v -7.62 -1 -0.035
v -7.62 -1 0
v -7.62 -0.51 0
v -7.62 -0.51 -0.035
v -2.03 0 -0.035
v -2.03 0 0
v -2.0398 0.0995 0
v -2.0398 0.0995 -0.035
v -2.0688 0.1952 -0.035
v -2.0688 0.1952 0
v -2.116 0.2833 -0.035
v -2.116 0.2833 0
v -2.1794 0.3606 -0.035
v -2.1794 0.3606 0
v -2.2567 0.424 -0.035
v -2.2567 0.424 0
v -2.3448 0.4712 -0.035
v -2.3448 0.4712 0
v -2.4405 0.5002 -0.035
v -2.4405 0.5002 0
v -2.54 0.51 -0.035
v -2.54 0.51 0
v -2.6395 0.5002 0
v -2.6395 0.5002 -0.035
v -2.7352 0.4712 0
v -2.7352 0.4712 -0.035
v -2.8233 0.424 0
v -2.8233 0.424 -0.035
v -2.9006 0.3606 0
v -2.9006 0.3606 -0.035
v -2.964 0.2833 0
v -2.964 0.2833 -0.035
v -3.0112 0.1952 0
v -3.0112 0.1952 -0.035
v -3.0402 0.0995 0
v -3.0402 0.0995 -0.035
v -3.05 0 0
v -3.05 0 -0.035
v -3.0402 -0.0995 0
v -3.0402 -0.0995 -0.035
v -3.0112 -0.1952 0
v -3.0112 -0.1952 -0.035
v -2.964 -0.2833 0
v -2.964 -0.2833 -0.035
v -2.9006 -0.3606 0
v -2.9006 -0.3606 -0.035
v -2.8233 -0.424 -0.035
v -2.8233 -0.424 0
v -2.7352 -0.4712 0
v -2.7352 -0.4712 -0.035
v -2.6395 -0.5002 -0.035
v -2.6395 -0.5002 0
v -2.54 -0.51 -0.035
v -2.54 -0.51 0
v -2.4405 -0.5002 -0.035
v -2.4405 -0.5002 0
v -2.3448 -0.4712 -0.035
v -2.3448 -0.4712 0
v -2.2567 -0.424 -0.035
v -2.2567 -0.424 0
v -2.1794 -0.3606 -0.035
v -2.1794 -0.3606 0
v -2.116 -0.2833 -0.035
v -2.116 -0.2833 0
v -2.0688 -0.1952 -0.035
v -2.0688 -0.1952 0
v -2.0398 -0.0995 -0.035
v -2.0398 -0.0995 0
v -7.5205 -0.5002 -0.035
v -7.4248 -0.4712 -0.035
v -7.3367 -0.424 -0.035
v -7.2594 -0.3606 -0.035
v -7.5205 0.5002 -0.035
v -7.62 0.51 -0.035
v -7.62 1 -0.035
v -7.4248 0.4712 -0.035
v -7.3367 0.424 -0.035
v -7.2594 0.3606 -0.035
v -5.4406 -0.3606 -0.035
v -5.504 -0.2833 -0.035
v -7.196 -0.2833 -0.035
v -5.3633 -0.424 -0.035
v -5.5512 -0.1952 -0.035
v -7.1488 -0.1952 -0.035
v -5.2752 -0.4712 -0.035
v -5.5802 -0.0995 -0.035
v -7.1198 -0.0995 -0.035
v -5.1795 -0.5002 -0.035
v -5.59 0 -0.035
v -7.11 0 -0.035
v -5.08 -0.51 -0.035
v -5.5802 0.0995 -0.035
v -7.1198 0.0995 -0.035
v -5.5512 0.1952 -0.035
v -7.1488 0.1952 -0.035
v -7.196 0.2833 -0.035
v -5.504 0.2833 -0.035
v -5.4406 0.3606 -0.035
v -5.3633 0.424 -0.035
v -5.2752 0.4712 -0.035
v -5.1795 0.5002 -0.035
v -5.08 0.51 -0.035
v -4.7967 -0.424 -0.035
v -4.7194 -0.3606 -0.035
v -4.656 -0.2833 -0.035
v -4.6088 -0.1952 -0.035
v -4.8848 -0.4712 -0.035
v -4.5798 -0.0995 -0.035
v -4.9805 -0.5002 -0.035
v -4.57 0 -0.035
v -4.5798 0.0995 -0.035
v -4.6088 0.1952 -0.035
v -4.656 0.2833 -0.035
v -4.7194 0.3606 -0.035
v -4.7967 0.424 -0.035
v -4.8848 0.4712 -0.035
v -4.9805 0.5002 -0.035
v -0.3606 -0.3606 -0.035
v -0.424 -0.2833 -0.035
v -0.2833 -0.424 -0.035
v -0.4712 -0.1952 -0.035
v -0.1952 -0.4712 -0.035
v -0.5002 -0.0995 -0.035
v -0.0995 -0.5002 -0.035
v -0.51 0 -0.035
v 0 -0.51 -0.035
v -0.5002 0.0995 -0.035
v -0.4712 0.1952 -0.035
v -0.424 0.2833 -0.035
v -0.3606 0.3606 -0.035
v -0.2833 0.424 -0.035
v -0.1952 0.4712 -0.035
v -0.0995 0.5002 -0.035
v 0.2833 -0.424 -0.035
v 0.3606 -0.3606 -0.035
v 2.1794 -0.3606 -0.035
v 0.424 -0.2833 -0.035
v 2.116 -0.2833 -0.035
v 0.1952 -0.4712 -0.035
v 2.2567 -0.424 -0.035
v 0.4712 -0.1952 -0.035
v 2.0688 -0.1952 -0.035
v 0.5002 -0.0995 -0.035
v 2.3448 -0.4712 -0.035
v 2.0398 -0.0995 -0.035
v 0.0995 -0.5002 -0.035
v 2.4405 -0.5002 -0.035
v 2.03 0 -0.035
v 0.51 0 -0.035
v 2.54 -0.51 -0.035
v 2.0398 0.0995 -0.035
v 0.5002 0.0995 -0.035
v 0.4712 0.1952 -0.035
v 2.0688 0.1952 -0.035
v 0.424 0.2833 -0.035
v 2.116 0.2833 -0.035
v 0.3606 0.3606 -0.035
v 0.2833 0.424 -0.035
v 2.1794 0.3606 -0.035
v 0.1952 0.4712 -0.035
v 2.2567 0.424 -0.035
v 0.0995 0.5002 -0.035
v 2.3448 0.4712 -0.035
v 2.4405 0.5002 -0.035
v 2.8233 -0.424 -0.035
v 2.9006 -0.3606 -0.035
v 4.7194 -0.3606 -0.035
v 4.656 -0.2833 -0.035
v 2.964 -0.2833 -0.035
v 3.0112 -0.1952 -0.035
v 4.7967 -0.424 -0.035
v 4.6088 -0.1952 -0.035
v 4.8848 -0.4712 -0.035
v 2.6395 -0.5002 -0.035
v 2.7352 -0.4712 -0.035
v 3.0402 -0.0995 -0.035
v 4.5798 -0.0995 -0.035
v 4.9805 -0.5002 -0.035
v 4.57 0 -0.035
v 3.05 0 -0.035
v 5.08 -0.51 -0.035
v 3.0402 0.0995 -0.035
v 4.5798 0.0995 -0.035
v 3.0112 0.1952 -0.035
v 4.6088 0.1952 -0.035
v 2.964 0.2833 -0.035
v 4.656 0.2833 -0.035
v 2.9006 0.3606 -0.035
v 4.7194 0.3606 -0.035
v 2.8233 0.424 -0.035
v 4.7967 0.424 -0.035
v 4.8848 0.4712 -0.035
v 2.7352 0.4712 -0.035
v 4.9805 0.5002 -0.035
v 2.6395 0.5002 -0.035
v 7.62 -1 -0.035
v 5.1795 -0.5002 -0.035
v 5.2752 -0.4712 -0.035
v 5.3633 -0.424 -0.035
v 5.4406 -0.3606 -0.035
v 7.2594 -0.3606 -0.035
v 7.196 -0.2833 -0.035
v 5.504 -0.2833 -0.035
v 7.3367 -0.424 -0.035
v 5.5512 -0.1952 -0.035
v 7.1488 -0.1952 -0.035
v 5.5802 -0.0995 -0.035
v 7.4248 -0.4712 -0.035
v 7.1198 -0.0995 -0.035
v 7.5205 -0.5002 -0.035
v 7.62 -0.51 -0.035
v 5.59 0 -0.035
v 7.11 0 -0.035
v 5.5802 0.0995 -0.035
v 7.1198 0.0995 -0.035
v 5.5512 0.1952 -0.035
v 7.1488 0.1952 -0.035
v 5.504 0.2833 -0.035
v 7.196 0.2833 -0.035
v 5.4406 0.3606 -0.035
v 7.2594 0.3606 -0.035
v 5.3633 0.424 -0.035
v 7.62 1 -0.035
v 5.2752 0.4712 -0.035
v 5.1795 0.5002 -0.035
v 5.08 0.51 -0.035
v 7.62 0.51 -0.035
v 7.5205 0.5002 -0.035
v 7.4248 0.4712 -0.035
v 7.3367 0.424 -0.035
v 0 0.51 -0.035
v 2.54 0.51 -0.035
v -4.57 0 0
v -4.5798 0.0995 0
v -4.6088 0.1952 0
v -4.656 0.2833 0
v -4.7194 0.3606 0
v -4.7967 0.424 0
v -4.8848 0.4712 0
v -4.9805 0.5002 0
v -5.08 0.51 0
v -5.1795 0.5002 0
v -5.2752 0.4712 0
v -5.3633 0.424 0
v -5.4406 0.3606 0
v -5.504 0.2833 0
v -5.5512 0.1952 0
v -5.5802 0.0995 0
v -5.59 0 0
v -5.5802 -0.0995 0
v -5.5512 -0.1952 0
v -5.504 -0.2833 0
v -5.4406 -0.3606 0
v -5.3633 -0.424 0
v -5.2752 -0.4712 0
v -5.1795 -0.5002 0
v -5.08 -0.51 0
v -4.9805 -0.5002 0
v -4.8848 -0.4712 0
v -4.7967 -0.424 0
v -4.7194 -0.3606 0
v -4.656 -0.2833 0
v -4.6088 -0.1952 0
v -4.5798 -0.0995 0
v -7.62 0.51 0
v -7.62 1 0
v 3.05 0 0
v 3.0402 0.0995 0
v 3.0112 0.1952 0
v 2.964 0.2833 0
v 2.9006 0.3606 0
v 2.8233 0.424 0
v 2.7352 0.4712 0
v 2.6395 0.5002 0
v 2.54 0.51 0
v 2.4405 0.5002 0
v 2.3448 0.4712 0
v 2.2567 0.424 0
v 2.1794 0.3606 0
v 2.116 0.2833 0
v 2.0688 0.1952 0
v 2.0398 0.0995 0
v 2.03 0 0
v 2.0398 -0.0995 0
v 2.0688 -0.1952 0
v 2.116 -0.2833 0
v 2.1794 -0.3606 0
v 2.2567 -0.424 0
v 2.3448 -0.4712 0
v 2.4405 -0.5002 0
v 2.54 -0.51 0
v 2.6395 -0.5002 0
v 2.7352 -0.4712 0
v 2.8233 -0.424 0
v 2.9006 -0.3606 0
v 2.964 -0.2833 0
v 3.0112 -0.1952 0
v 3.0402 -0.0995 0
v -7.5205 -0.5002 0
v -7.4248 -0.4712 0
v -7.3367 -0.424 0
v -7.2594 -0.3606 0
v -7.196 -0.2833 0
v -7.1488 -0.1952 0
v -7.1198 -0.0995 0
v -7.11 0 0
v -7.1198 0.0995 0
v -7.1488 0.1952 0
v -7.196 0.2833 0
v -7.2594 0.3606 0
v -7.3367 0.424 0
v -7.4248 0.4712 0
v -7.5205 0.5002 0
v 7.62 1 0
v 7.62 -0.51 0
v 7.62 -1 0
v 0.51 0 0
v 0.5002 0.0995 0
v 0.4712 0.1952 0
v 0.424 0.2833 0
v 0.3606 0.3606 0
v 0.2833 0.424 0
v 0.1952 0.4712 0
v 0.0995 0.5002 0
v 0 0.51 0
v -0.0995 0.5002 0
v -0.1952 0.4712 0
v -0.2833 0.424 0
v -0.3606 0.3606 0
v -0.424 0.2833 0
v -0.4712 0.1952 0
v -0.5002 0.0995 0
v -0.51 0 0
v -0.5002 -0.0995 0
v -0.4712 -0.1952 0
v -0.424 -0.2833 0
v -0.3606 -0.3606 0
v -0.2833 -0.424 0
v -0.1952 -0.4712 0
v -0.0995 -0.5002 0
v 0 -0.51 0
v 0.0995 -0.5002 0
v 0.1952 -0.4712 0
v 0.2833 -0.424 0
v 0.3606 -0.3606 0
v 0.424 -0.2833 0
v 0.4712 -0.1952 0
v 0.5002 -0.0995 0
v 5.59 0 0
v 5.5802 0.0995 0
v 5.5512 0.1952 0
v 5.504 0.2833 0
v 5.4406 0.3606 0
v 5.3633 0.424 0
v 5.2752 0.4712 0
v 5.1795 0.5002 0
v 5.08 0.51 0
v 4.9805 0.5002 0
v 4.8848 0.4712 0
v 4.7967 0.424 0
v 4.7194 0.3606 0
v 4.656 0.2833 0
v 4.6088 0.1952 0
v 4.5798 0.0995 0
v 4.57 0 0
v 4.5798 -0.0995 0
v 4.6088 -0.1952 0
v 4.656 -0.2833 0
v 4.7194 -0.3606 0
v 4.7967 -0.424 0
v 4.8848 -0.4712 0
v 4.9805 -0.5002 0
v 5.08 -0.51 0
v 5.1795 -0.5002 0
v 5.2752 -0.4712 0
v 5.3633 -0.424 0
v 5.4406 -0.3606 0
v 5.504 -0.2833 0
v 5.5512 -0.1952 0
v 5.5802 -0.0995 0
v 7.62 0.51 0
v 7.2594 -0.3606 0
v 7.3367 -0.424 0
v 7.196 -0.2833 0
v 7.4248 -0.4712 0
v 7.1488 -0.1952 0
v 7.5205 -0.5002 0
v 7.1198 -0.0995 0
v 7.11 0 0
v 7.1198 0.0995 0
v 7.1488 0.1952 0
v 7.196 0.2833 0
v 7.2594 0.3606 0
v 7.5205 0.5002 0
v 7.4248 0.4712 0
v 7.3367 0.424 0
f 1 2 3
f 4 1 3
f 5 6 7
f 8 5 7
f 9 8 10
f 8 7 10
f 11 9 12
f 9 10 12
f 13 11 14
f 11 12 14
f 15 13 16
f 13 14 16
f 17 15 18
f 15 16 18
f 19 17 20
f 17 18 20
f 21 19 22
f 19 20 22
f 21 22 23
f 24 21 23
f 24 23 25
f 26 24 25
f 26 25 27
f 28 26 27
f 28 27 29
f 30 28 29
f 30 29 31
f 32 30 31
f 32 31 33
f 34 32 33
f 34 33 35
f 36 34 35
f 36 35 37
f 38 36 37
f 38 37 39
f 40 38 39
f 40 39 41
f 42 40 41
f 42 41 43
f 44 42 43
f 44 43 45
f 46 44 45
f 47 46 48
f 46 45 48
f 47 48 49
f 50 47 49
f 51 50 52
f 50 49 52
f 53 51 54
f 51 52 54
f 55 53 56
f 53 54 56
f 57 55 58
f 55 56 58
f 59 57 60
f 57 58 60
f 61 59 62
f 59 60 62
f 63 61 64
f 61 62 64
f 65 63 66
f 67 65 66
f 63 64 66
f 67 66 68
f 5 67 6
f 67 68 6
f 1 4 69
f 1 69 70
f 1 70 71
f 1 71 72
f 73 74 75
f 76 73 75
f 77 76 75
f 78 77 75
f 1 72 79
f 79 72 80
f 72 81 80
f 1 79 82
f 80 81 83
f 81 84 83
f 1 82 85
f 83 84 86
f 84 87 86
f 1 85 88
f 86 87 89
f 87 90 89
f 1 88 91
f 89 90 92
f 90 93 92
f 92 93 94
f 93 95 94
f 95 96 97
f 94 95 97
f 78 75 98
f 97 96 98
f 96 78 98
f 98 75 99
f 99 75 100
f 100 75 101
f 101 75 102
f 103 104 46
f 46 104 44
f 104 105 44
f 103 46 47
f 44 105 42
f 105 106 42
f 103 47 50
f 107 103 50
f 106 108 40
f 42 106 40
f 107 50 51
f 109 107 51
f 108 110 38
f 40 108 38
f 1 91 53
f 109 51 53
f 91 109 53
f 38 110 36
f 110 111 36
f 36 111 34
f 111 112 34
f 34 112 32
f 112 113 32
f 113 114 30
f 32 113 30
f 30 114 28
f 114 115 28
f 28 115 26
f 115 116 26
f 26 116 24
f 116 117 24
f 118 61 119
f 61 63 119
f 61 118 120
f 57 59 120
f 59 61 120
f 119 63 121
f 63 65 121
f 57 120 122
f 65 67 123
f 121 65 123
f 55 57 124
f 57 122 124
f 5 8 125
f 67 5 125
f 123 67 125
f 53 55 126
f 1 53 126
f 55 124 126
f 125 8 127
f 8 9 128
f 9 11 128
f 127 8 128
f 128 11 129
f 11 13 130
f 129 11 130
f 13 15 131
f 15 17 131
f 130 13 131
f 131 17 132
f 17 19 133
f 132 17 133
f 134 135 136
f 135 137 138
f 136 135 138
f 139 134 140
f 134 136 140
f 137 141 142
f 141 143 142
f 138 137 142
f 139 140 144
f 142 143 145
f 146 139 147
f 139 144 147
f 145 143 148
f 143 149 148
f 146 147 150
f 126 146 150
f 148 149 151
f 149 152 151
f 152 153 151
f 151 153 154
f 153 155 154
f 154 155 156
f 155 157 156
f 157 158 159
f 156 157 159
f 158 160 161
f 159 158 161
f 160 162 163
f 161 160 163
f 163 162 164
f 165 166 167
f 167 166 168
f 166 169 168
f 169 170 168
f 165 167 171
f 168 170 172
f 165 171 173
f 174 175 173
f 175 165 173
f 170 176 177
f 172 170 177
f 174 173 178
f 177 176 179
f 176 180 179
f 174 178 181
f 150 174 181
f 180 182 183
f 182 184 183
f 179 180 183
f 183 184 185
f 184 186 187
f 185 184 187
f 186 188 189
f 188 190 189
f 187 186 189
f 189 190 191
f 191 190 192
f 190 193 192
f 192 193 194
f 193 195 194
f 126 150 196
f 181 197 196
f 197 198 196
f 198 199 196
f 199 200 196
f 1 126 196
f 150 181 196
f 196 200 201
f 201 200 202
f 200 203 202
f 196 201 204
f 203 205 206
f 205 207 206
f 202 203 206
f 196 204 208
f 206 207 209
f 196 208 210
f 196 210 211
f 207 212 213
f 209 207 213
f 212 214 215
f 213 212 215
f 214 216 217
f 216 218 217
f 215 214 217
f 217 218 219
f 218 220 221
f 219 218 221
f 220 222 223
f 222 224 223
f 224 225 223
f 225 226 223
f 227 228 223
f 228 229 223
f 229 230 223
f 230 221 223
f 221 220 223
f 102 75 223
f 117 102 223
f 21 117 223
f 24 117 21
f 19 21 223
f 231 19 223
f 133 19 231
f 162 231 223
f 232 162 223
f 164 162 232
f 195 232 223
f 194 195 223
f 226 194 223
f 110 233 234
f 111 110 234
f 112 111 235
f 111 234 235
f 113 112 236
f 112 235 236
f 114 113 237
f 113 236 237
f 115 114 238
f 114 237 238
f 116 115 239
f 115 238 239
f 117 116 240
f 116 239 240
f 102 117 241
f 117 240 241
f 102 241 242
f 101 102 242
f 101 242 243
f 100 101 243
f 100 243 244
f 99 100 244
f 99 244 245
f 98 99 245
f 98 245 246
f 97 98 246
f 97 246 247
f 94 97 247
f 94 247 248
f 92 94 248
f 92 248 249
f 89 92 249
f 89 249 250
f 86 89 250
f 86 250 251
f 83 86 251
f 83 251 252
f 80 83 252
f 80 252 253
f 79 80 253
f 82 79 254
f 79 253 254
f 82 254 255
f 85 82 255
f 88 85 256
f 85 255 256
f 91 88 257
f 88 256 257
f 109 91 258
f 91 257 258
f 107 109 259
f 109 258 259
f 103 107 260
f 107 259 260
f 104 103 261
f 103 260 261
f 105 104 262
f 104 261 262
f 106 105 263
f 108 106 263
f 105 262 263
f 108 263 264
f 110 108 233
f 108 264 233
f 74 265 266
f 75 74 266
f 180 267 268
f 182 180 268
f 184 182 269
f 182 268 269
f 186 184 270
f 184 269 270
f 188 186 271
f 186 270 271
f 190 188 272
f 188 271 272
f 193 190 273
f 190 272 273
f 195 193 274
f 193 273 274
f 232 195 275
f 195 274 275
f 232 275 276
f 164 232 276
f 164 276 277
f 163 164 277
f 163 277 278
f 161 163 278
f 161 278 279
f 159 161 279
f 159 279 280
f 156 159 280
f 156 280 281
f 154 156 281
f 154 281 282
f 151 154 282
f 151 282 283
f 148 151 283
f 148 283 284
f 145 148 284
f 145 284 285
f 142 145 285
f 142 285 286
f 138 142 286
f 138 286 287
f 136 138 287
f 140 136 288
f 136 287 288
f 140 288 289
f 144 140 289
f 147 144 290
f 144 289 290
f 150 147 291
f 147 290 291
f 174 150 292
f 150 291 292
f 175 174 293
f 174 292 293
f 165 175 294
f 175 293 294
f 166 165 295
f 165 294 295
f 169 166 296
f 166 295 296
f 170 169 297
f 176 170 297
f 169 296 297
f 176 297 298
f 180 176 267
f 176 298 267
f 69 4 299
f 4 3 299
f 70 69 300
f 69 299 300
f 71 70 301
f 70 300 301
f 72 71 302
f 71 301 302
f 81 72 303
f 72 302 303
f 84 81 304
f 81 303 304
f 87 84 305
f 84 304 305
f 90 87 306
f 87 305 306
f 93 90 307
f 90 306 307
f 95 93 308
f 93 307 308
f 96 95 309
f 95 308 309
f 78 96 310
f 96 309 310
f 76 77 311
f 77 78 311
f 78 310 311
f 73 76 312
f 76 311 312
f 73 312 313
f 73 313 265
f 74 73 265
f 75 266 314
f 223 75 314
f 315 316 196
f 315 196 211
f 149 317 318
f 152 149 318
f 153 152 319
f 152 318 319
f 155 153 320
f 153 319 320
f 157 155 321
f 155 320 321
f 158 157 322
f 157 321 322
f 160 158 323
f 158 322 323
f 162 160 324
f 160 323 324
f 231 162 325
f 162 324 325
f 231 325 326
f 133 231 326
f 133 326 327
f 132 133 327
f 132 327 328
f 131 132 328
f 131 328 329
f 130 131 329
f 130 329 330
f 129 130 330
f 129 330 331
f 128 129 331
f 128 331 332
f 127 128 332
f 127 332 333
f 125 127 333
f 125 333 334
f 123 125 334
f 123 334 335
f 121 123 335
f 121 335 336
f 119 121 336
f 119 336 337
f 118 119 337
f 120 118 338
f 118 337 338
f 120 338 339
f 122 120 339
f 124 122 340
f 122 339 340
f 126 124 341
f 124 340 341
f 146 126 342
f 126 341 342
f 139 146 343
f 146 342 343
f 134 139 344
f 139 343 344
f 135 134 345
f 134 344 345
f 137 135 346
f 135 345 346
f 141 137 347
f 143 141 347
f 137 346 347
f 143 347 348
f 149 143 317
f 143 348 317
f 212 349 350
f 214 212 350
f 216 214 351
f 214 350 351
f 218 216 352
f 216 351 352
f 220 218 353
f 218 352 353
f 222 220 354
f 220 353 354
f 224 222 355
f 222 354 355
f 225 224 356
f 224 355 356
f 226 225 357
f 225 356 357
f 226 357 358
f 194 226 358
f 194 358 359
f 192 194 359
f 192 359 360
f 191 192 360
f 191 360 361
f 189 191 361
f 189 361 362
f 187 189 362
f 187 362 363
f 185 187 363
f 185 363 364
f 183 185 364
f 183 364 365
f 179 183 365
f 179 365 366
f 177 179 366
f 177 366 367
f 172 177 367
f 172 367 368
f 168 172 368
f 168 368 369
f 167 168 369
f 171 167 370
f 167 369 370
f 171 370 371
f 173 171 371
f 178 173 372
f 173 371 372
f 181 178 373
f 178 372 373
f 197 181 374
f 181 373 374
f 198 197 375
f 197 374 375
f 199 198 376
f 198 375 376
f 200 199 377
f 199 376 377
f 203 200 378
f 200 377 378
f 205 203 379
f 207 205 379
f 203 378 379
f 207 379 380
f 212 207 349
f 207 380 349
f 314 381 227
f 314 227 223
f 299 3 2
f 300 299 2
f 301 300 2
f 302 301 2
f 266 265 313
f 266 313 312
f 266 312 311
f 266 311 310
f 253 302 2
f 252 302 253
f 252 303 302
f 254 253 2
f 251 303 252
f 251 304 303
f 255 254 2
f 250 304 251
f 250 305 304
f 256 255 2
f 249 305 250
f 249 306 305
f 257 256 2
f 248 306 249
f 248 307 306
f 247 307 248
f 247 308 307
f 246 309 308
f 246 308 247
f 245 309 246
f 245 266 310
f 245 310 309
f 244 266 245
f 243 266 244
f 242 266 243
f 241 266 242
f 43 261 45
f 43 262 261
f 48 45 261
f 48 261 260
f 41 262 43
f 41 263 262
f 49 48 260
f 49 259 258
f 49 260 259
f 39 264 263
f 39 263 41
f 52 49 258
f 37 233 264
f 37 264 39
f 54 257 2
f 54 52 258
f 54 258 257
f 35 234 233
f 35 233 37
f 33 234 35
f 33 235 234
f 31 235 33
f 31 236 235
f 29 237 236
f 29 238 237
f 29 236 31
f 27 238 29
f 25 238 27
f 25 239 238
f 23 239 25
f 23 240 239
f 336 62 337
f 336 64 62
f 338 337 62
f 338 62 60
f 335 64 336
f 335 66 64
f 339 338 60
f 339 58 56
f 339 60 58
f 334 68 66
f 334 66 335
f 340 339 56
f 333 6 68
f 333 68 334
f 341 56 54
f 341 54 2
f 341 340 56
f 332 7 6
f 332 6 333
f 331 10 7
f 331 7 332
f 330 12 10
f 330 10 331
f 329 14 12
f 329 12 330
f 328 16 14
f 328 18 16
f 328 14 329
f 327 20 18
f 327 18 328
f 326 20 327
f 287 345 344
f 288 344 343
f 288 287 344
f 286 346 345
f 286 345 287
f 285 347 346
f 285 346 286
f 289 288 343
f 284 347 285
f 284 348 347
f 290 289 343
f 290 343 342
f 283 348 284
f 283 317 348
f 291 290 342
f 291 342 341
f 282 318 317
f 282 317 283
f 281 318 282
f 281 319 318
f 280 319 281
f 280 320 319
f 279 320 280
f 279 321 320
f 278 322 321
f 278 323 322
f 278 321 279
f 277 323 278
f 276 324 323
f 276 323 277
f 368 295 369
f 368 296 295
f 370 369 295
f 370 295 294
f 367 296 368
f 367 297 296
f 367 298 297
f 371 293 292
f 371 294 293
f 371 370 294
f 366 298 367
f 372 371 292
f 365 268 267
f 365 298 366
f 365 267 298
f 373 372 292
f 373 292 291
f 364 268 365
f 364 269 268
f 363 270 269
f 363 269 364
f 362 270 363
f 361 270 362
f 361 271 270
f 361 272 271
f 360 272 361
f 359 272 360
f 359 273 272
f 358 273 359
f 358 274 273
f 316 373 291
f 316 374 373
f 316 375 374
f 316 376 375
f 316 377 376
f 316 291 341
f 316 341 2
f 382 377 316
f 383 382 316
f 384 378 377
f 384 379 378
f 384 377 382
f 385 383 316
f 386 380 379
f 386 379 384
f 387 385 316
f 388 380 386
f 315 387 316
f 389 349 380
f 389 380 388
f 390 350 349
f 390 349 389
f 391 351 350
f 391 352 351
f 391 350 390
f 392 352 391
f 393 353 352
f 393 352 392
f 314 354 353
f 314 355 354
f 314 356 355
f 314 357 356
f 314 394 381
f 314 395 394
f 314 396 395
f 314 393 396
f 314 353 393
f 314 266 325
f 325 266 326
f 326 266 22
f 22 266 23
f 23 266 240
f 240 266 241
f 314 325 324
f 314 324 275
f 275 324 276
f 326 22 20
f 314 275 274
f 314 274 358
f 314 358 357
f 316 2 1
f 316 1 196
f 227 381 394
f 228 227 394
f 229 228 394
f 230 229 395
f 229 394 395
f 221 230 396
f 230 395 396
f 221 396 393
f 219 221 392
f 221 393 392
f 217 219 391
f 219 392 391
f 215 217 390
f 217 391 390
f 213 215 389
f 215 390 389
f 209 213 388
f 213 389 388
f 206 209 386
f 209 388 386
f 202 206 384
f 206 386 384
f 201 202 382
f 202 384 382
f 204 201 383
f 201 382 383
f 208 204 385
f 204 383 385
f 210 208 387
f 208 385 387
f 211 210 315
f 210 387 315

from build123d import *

# Parameters (mm, degrees)
SKETCH002_W            = 15.24
SKETCH002_H            = 2
PAD001_DEPTH           = 0.035
SKETCH003_R            = 0.51
POCKET001_DEPTH        = 0.036
LINEARPATTERN004_COUNT = 7
LINEARPATTERN004_PITCH = 2.54


with BuildPart() as part:
    # Sketch002 → Pad001 (new body)
    with BuildSketch(Plane.XY):
        Rectangle(SKETCH002_W, SKETCH002_H)
    extrude(amount=-PAD001_DEPTH)

    # Sketch003 → Pocket001 (cut, through all)
    with BuildSketch(Plane.XY):
        with Locations((-7.62, 0)):
            Circle(SKETCH003_R)
    pocket001 = extrude(amount=-POCKET001_DEPTH, mode=Mode.SUBTRACT)

    # LinearPattern004: Pocket001 ×7
    with Locations(*[(i * LINEARPATTERN004_PITCH, 0, 0) for i in range(1, LINEARPATTERN004_COUNT)]):
        add(pocket001, mode=Mode.SUBTRACT)


solid = part.part
